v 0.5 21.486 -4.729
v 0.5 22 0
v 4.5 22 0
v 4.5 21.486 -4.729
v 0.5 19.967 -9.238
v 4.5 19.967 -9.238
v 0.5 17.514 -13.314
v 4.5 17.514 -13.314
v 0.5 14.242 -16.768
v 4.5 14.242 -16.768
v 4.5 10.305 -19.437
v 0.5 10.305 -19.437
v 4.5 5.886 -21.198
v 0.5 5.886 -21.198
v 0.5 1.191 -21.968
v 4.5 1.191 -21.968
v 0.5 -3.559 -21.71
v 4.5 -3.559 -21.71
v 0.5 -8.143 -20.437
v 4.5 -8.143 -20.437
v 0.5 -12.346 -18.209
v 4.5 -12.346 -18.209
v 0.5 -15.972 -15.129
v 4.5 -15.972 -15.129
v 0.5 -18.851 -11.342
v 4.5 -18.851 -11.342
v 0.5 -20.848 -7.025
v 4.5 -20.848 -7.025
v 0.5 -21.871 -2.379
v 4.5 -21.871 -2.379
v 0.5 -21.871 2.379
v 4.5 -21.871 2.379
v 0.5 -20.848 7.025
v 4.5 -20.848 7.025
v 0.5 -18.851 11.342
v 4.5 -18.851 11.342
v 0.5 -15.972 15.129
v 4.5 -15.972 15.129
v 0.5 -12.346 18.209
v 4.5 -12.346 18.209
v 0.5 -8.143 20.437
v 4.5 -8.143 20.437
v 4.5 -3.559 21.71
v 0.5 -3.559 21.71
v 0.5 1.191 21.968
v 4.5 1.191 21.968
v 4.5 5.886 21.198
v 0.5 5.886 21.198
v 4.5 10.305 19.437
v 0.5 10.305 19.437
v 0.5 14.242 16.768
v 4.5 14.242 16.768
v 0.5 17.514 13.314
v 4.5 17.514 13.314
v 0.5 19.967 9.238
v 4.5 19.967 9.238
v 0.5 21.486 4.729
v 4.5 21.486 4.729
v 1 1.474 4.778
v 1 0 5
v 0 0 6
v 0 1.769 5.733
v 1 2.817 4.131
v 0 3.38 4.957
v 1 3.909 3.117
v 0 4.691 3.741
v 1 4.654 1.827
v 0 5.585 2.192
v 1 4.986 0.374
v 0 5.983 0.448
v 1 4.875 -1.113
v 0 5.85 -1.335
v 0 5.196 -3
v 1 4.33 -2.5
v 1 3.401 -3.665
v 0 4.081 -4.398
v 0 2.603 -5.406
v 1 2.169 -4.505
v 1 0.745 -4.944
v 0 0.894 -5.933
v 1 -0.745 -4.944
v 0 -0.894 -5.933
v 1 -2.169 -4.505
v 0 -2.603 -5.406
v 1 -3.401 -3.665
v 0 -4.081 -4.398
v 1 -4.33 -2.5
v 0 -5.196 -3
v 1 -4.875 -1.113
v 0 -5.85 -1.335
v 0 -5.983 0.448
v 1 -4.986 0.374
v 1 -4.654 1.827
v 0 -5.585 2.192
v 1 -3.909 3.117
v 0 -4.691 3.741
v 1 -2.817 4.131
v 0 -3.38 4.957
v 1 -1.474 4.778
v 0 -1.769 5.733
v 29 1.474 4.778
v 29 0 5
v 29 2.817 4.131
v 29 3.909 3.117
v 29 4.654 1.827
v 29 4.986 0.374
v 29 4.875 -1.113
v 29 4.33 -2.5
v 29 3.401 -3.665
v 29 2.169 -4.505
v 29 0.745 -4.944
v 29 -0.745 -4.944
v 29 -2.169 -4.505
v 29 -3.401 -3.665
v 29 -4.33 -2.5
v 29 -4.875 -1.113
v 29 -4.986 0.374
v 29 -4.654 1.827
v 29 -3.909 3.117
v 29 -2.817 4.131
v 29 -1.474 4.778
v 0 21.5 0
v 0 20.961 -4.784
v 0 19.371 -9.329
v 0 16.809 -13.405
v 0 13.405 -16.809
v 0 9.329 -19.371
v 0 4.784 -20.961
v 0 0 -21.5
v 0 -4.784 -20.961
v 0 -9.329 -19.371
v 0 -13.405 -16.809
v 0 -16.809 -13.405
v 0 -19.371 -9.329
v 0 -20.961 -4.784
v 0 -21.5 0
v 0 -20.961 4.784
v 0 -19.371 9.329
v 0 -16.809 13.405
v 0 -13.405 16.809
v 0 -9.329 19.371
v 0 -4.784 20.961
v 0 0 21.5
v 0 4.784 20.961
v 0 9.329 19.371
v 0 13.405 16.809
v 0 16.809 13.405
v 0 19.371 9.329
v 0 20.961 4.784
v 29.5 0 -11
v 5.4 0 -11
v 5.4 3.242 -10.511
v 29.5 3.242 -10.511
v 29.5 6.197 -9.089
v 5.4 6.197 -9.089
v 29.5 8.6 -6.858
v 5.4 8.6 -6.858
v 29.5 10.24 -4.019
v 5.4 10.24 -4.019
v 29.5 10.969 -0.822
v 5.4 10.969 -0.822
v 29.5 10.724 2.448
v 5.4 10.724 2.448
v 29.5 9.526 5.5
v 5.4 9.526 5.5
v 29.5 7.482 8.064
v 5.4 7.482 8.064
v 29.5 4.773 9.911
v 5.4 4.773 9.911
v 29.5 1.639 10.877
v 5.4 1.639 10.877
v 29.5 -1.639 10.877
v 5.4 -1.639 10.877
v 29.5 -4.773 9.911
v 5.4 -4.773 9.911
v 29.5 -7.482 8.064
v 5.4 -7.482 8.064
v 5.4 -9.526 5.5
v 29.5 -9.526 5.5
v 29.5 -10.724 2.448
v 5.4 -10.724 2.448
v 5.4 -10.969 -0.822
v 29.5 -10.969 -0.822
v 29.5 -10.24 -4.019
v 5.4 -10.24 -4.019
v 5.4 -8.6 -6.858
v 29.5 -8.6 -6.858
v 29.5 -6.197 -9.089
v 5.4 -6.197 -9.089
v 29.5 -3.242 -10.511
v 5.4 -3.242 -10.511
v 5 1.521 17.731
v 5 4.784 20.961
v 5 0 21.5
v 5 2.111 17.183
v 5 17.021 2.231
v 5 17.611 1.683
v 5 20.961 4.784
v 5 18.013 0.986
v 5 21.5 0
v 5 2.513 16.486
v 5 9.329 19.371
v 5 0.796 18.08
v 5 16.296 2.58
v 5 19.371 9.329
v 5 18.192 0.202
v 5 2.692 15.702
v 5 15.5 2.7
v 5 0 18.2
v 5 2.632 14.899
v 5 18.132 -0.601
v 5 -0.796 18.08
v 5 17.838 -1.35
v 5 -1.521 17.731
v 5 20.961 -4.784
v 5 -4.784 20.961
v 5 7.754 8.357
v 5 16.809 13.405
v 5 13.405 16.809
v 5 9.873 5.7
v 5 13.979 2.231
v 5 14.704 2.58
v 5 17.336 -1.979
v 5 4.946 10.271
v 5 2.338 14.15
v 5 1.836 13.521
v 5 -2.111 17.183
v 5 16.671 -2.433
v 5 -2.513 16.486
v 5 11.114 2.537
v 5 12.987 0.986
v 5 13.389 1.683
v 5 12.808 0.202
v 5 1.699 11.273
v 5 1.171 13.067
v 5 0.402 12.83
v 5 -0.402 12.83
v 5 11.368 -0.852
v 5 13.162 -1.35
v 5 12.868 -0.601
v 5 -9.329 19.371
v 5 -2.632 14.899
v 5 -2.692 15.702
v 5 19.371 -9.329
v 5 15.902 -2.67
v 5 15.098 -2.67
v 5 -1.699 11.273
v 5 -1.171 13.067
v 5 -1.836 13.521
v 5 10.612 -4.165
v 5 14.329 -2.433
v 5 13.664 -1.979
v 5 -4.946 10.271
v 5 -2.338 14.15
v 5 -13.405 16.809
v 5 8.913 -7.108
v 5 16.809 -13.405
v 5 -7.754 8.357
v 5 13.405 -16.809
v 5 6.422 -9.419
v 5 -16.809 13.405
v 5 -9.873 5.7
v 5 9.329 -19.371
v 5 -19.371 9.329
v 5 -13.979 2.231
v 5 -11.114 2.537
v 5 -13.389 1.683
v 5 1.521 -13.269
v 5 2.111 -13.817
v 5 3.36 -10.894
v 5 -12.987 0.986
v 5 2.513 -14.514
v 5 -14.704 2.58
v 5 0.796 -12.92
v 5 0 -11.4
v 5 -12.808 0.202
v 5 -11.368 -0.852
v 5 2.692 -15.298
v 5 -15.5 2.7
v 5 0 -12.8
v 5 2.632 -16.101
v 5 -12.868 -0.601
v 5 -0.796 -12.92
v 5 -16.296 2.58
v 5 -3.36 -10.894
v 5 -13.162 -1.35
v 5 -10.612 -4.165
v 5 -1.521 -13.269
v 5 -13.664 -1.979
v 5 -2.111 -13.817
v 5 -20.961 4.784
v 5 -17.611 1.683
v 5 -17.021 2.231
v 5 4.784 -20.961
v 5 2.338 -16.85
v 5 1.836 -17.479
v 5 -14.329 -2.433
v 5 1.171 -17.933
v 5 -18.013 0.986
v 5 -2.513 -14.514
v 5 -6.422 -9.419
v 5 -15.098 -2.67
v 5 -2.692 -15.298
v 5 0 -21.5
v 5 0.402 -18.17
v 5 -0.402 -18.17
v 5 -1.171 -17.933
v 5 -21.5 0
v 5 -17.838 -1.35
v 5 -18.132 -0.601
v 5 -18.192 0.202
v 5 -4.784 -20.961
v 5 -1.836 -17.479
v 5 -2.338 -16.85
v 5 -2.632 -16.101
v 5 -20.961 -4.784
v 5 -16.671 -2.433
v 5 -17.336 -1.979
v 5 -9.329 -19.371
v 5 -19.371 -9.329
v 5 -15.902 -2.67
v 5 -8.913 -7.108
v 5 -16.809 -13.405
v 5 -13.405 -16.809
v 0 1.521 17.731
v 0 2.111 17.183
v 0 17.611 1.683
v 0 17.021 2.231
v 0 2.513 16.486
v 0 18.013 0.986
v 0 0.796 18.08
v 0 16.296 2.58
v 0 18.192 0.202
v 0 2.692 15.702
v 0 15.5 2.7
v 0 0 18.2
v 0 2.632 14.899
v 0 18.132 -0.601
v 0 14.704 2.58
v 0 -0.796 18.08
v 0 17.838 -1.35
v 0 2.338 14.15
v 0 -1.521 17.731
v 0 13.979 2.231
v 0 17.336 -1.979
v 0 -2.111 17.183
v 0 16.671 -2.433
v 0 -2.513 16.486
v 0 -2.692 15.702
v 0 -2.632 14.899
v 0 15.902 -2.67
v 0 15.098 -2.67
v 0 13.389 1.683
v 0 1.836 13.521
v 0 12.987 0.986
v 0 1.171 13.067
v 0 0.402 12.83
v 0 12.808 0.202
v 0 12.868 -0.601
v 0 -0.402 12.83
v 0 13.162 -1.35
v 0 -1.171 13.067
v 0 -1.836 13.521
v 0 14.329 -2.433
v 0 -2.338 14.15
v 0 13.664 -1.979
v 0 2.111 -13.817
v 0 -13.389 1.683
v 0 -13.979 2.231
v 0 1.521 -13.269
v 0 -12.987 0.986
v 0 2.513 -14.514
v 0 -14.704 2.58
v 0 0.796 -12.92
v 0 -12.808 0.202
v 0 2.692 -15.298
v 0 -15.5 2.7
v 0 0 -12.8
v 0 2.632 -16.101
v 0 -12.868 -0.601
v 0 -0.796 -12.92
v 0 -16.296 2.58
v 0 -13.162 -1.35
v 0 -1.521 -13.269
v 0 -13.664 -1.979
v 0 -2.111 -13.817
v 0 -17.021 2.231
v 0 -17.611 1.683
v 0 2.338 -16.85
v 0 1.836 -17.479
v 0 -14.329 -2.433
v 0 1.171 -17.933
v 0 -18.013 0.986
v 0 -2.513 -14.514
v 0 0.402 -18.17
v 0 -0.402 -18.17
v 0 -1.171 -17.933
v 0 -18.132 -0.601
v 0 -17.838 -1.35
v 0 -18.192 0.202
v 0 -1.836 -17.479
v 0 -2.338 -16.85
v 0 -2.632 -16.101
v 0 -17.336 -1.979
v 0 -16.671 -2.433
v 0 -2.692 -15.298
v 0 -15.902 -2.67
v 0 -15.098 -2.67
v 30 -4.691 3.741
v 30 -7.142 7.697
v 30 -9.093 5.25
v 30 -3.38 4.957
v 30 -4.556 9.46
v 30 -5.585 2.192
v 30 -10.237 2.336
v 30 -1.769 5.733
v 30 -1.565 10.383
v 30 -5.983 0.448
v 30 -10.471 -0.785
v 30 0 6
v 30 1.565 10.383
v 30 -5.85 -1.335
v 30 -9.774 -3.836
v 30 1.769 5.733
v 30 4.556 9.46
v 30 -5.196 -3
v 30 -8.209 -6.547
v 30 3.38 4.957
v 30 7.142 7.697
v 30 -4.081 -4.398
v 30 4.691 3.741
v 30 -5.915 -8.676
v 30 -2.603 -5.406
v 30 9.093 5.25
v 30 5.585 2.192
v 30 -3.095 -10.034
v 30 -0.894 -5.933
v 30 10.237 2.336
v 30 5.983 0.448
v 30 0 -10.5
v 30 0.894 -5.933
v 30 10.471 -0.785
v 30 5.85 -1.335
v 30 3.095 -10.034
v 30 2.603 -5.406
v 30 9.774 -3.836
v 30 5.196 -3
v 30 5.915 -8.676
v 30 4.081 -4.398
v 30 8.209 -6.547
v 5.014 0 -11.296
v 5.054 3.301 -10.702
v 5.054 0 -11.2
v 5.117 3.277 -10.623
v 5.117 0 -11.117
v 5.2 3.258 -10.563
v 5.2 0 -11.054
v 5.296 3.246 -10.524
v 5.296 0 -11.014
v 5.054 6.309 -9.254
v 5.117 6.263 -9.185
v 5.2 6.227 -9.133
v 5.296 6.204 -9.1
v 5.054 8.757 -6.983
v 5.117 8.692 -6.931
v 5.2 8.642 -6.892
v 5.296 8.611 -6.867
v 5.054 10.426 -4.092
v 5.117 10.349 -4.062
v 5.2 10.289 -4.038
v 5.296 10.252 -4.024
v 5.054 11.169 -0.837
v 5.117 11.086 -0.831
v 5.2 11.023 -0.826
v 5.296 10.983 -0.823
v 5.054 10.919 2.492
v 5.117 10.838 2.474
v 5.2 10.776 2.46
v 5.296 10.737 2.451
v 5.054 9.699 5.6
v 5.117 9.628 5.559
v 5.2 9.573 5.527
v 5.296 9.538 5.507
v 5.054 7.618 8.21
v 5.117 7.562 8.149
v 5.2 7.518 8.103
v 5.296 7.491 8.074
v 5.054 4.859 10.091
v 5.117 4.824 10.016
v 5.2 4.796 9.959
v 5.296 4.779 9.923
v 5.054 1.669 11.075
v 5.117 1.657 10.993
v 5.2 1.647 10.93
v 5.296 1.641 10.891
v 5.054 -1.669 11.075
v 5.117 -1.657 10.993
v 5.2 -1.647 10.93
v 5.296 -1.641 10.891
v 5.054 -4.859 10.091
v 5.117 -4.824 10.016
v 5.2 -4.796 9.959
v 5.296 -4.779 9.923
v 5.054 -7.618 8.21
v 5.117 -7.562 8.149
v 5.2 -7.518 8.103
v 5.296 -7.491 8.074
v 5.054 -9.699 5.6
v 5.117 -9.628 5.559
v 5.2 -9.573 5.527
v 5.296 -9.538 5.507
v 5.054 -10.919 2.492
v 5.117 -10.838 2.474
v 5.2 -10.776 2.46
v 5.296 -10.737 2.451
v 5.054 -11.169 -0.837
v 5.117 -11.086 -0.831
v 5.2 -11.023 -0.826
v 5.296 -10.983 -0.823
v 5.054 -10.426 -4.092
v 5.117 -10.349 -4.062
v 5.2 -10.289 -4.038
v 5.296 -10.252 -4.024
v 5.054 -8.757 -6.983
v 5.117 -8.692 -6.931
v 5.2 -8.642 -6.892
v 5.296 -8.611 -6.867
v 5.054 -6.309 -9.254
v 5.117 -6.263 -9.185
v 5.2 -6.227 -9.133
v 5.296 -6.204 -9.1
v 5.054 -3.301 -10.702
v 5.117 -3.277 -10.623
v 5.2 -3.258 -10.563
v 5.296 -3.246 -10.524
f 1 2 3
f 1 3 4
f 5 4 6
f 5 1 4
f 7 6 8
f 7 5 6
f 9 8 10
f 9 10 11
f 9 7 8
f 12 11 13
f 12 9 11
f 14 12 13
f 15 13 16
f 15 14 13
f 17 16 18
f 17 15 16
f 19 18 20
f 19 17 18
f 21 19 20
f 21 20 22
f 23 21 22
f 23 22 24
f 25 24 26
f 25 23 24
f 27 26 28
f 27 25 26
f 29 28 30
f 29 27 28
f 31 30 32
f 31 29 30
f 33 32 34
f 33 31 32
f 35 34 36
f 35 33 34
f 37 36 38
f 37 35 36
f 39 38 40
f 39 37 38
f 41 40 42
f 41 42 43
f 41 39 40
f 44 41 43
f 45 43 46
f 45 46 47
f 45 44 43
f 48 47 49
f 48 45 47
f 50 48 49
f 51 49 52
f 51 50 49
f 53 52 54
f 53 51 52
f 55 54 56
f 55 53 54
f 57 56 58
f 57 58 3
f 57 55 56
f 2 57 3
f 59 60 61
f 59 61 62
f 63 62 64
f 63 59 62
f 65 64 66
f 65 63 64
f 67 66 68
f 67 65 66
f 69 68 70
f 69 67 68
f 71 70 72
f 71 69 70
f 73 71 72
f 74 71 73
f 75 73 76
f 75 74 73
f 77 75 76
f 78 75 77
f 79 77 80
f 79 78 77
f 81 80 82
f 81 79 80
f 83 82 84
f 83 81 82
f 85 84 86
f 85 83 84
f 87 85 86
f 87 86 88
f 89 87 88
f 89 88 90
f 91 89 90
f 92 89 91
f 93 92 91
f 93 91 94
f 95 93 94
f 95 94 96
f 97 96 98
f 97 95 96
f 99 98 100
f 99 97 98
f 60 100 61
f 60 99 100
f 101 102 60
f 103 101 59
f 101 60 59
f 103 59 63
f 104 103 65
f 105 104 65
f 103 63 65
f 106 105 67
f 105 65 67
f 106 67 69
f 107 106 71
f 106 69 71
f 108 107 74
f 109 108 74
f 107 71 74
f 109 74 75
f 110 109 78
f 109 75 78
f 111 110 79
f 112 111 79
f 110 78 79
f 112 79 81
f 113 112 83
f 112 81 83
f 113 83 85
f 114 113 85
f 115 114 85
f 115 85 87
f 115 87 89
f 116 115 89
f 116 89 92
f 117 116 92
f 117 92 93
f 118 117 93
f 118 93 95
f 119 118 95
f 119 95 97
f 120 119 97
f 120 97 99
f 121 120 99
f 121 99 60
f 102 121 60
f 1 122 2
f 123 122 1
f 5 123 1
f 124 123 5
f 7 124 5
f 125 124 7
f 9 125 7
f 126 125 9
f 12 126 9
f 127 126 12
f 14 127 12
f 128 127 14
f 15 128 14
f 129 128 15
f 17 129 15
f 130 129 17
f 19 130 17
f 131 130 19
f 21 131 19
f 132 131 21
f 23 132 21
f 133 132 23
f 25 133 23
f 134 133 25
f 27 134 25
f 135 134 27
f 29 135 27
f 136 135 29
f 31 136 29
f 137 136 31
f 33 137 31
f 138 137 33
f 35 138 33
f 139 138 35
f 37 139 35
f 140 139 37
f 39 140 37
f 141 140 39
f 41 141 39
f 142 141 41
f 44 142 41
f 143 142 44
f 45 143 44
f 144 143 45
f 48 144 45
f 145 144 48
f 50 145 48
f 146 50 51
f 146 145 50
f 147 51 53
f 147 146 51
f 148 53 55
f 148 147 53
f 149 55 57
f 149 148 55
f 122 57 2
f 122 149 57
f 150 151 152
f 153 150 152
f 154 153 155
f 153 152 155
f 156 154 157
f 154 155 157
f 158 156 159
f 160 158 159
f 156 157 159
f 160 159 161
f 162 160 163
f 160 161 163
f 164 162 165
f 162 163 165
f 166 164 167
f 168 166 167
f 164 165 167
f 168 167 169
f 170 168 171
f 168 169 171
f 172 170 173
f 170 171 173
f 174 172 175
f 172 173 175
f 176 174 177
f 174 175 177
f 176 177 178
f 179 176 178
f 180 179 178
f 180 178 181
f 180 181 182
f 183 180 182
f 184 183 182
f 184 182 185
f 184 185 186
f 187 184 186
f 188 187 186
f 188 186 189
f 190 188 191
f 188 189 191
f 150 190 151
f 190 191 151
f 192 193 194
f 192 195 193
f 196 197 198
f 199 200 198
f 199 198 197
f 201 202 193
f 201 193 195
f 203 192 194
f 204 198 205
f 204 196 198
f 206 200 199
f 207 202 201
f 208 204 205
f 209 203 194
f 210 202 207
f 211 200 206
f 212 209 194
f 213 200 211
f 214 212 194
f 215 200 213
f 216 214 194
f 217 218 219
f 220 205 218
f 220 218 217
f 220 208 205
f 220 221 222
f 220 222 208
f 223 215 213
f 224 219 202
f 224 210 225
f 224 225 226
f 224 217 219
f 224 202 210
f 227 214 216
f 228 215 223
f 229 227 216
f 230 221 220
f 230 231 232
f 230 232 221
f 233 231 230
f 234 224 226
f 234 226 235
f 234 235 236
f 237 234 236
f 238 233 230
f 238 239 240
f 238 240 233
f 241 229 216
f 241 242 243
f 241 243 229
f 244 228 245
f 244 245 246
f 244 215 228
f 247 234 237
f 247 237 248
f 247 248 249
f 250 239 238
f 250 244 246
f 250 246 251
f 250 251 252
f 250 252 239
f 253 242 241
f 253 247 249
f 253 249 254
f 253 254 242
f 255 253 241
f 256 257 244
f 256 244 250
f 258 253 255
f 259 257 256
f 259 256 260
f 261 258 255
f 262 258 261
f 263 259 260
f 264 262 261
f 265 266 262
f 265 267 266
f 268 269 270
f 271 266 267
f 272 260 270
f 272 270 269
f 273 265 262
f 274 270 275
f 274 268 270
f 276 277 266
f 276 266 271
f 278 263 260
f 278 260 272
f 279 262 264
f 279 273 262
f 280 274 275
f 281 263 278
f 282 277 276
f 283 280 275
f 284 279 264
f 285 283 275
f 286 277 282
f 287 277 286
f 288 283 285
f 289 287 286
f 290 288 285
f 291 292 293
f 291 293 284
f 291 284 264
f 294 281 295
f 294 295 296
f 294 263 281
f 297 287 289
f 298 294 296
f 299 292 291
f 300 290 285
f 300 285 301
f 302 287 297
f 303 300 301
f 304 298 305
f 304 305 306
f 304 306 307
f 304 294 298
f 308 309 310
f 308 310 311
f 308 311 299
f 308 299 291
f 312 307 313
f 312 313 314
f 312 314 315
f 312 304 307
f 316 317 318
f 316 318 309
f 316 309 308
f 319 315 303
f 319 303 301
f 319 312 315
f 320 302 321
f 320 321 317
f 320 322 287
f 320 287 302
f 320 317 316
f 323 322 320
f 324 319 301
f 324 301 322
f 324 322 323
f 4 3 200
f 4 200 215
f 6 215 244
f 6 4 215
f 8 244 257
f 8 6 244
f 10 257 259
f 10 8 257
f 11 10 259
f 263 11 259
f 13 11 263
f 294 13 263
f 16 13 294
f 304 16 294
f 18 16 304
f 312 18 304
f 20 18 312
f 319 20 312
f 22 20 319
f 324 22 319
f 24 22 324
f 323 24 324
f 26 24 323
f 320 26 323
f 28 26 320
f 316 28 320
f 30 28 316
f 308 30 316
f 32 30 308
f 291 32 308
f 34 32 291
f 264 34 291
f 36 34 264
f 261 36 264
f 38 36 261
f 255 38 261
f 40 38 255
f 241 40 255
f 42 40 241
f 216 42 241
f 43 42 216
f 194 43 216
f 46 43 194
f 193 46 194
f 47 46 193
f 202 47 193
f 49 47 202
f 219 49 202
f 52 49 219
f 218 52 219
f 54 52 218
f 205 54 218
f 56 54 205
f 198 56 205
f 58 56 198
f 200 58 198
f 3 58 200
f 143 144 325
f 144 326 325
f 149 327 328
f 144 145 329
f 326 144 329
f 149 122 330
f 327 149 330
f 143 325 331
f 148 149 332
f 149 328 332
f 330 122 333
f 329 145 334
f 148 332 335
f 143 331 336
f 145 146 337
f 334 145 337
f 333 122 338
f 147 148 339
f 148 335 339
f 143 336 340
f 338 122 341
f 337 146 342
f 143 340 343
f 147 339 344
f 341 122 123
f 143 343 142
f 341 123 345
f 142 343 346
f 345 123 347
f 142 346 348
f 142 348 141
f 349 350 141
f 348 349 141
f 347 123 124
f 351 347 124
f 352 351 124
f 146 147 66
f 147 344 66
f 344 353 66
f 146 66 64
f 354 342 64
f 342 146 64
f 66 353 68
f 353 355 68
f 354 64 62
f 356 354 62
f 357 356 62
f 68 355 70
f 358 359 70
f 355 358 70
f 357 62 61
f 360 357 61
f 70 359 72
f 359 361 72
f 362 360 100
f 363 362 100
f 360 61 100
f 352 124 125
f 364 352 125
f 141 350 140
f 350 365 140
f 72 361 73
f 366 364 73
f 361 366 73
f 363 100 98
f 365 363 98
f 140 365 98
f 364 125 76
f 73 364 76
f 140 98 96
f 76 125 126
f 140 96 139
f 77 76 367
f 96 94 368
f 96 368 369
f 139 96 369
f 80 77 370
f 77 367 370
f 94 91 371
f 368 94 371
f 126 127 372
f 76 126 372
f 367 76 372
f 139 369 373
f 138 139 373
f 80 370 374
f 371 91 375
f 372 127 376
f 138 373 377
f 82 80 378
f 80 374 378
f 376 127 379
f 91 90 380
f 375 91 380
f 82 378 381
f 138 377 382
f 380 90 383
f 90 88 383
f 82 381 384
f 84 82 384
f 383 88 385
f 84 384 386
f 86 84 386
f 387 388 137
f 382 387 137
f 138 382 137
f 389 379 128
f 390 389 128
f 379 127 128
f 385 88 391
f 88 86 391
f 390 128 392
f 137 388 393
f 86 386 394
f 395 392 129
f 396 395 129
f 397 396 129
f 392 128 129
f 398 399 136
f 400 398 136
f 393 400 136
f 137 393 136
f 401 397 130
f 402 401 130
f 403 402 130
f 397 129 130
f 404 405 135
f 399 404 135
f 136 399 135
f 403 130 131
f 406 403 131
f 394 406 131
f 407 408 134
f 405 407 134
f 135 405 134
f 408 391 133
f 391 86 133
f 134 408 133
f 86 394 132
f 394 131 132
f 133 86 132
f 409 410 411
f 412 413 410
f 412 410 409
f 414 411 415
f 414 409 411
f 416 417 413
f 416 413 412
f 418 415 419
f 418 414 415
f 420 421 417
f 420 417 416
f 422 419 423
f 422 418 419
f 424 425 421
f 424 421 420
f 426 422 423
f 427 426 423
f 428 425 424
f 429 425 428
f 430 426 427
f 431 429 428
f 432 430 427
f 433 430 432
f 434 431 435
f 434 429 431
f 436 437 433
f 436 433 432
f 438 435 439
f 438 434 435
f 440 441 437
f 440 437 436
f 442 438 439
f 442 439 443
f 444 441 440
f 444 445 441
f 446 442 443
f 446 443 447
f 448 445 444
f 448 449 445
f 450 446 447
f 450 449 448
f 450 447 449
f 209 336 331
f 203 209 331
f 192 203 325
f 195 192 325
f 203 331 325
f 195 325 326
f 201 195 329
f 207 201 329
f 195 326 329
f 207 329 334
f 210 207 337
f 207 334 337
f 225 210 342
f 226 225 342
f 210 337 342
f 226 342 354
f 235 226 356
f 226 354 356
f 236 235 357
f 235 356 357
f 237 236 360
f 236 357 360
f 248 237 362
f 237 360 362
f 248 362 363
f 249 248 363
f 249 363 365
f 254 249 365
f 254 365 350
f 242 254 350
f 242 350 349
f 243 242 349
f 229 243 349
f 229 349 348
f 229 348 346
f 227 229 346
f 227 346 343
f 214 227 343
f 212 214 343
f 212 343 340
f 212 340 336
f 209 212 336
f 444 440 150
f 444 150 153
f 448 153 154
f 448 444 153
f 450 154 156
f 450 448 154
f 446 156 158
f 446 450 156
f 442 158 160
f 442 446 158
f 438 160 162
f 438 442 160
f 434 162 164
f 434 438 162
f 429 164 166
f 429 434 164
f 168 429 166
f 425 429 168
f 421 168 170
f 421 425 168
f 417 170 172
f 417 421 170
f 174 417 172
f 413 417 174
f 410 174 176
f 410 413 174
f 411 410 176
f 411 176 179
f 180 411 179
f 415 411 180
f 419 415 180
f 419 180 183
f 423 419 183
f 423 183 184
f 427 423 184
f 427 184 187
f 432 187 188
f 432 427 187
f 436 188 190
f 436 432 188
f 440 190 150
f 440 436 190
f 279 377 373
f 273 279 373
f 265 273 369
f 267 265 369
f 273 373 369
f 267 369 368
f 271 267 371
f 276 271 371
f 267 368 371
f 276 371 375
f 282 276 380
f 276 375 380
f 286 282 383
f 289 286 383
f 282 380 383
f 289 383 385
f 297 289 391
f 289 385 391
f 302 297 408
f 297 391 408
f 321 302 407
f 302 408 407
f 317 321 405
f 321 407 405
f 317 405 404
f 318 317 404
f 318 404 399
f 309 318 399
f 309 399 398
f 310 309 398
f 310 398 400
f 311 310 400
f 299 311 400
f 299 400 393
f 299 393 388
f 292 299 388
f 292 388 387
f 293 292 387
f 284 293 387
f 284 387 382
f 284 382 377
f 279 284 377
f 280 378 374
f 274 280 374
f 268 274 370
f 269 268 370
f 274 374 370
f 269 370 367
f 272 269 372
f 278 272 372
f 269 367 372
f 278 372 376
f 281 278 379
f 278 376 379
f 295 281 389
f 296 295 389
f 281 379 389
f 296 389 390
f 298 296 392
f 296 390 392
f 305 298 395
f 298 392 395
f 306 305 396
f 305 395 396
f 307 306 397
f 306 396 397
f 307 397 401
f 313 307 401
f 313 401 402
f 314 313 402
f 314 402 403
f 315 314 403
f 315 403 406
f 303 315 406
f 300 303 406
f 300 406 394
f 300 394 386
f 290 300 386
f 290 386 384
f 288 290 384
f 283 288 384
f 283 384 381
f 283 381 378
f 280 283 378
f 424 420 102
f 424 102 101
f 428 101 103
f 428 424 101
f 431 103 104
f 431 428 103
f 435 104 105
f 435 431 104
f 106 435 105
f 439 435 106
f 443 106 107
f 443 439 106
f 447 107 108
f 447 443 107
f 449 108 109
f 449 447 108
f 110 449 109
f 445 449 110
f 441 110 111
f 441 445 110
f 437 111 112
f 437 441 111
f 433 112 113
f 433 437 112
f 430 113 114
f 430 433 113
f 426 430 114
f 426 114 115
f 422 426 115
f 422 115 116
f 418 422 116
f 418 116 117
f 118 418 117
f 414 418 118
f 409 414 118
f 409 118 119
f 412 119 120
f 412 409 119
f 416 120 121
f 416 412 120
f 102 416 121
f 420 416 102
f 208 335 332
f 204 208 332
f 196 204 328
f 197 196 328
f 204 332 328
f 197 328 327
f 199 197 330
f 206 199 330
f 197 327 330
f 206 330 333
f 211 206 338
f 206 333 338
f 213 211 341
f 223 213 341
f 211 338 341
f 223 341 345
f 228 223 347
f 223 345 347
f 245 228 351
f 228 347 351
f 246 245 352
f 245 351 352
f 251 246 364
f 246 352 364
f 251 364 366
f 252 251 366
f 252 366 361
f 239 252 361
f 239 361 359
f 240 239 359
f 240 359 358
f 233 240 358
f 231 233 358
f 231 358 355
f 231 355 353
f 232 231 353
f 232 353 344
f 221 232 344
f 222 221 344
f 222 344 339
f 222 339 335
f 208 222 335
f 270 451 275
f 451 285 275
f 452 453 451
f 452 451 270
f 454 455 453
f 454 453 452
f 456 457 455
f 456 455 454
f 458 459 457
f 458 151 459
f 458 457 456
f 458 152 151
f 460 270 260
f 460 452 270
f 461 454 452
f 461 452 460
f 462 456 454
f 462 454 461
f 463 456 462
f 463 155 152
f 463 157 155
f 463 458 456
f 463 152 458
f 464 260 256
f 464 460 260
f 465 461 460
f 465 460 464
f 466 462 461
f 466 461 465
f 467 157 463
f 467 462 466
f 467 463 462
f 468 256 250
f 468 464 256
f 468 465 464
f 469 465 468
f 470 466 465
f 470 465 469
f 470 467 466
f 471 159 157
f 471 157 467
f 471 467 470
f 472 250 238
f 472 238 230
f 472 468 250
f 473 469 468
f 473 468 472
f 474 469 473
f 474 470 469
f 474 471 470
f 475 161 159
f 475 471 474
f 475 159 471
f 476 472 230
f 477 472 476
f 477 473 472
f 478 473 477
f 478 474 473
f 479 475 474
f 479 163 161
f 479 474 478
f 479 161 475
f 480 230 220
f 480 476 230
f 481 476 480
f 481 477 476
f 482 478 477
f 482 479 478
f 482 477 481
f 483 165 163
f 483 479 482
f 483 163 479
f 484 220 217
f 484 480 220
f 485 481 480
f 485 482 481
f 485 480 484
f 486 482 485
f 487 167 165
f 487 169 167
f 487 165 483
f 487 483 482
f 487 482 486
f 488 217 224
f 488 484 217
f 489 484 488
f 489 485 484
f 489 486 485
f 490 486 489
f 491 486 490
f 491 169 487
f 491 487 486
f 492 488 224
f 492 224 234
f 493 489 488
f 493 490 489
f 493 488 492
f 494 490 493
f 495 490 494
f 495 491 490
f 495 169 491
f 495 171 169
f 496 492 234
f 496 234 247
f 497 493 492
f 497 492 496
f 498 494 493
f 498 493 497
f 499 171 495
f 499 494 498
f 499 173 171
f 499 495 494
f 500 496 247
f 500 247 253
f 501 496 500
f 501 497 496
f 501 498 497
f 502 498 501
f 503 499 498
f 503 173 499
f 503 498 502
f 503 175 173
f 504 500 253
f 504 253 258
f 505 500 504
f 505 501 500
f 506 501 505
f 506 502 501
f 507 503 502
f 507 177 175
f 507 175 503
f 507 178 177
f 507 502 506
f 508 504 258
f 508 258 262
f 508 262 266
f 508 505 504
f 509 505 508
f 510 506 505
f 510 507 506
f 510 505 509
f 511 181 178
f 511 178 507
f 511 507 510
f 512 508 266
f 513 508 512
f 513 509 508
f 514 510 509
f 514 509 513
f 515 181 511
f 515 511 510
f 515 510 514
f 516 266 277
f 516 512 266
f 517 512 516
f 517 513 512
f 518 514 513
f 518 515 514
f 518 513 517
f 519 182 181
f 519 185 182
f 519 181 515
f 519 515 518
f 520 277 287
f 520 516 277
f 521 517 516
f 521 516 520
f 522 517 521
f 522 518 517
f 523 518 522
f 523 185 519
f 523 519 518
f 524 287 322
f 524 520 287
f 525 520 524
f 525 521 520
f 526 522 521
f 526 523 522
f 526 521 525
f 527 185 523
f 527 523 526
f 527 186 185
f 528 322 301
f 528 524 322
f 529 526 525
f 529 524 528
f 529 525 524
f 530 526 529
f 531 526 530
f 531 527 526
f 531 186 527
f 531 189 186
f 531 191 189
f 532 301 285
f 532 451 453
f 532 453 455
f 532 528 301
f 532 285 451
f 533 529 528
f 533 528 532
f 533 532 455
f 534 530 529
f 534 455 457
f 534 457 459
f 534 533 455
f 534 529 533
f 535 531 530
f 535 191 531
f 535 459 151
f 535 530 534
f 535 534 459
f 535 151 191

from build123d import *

# Parameters (mm, degrees)
SKETCH1_W      = 5
SKETCH1_H      = 22
SKETCH2_R      = 11
EXTRUDE1_DEPTH = 25
HOLEWZD1_D     = 5.4
HOLEWZD2_D     = 10
HOLEWZD2_DEPTH = 30
CHAMFER1_SIZE  = 0.5
CHAMFER2_SIZE  = 1
FILLET1_R      = 0.4


with BuildPart() as part:
    # Sketch1 → Revolve1 (revolve)
    with BuildSketch(Plane(origin=(0, 0, 0), x_dir=(-1, 0, 0), z_dir=(0, 0, -1))):
        with Locations((-2.5, 11)):
            Rectangle(SKETCH1_W, SKETCH1_H)
    revolve(axis=Axis((5, 0, 0), (-1, 0, 0)))

    # Sketch2 → Extrude1 (add)
    with BuildSketch(Plane(origin=(5, 0, 0), x_dir=(0, 0, -1), z_dir=(1, 0, 0))):
        Circle(SKETCH2_R)
    extrude(amount=EXTRUDE1_DEPTH)

    # HoleWzd1 (through all)
    with Locations(Plane(origin=(5, 0, 0), x_dir=(0, 0, -1), z_dir=(1, 0, 0))):
        with Locations((0, -15.5), (15.5, 0), (-15.5, 0), (0, 15.5)):
            Hole(HOLEWZD1_D / 2)

    # HoleWzd2
    with Locations(Plane(origin=(30, 0, 0), x_dir=(0, 0, -1), z_dir=(1, 0, 0))):
        with Locations((0, 0)):
            Hole(HOLEWZD2_D / 2, depth=HOLEWZD2_DEPTH)

    # Chamfer1
    chamfer1_edges = [part.edges().sort_by_distance(p)[0] for p in [
        (0, -22, 0),
        (5, -22, 0),
        (30, 0, 11),
    ]]
    chamfer(chamfer1_edges, length=CHAMFER1_SIZE)

    # Chamfer2
    chamfer2_edges = [part.edges().sort_by_distance(p)[0] for p in [
        (30, 0, -5),
        (0, 0, -5),
    ]]
    chamfer(chamfer2_edges, length=CHAMFER2_SIZE)

    # Fillet1
    fillet1_edges = [part.edges().sort_by_distance(p)[0] for p in [
        (5, 0, 11),
    ]]
    fillet(fillet1_edges, radius=FILLET1_R)


solid = part.part
